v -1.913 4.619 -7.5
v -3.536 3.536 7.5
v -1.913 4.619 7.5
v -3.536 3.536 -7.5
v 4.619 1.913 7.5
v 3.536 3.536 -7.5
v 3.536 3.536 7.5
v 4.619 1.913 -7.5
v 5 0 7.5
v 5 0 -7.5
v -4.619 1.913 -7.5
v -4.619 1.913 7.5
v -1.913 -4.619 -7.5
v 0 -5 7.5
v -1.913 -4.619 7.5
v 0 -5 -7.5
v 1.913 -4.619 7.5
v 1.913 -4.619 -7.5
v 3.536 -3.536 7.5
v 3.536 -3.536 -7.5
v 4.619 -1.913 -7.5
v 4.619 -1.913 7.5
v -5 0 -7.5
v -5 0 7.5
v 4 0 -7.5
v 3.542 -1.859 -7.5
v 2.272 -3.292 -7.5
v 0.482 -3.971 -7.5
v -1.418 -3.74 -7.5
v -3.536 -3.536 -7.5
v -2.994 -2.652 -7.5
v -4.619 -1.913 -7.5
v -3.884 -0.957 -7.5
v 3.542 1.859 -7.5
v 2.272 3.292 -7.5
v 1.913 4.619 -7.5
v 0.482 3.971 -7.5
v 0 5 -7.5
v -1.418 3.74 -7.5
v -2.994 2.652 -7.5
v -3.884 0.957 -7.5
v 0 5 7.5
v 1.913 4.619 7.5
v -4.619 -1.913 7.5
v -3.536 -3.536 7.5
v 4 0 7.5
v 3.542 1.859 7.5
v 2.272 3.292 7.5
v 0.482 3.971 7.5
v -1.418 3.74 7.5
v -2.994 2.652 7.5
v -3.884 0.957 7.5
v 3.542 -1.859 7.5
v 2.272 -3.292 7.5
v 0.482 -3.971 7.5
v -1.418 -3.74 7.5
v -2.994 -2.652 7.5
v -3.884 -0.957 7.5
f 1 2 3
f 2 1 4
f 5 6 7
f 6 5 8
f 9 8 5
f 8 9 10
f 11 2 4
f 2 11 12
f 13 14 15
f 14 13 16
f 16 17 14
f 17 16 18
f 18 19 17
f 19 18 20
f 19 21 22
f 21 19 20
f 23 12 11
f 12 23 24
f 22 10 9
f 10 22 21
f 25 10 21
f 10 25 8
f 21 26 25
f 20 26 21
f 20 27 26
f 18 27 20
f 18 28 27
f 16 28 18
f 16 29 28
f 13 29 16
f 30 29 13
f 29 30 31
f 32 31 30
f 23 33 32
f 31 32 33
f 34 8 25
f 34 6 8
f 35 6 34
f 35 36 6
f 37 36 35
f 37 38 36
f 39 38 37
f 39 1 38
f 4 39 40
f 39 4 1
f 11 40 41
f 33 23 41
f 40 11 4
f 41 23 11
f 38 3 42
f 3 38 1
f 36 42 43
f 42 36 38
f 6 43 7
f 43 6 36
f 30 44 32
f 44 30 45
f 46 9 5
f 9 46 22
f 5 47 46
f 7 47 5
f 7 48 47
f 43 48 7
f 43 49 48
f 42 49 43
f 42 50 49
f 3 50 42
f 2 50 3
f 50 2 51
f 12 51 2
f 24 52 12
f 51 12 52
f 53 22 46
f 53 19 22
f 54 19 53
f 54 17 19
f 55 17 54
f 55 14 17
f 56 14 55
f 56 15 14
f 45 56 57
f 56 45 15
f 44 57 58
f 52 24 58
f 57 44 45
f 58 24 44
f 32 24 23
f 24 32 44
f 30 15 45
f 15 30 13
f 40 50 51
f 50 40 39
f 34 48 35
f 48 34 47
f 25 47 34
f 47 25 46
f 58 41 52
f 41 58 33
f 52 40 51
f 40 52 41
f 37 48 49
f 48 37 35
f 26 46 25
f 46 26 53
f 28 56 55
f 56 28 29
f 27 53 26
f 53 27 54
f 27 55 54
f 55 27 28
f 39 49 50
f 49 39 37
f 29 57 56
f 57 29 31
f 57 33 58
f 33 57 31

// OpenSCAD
// Parameters
length = 15; //[8:30:1]
outer_diameter = 10; //[5:20:0.5]
inner_diameter = 8; //[3:18:0.5]
forced_id = 0; //[0:18:0.5]
center = 1; //[0:1:1]
eps = 0.8; //[0.5:2:0.1]

// Tubing - complete geometry
module tubing() {
  color([0.85, 0.85, 0.8]) { // PVC-like color
    difference() {
      // Outer tube
      cylinder(h=length, r=outer_diameter/2, center=true);
      // Inner bore
      cylinder(h=length + 2*eps, r=((forced_id > 0) ? forced_id : inner_diameter)/2, center=true);
    }
  }
}

// Assembly
module assembly() {
  translate([0, 0, ((center > 0) ? 0 : (length/2))]) tubing();
}

assembly();
